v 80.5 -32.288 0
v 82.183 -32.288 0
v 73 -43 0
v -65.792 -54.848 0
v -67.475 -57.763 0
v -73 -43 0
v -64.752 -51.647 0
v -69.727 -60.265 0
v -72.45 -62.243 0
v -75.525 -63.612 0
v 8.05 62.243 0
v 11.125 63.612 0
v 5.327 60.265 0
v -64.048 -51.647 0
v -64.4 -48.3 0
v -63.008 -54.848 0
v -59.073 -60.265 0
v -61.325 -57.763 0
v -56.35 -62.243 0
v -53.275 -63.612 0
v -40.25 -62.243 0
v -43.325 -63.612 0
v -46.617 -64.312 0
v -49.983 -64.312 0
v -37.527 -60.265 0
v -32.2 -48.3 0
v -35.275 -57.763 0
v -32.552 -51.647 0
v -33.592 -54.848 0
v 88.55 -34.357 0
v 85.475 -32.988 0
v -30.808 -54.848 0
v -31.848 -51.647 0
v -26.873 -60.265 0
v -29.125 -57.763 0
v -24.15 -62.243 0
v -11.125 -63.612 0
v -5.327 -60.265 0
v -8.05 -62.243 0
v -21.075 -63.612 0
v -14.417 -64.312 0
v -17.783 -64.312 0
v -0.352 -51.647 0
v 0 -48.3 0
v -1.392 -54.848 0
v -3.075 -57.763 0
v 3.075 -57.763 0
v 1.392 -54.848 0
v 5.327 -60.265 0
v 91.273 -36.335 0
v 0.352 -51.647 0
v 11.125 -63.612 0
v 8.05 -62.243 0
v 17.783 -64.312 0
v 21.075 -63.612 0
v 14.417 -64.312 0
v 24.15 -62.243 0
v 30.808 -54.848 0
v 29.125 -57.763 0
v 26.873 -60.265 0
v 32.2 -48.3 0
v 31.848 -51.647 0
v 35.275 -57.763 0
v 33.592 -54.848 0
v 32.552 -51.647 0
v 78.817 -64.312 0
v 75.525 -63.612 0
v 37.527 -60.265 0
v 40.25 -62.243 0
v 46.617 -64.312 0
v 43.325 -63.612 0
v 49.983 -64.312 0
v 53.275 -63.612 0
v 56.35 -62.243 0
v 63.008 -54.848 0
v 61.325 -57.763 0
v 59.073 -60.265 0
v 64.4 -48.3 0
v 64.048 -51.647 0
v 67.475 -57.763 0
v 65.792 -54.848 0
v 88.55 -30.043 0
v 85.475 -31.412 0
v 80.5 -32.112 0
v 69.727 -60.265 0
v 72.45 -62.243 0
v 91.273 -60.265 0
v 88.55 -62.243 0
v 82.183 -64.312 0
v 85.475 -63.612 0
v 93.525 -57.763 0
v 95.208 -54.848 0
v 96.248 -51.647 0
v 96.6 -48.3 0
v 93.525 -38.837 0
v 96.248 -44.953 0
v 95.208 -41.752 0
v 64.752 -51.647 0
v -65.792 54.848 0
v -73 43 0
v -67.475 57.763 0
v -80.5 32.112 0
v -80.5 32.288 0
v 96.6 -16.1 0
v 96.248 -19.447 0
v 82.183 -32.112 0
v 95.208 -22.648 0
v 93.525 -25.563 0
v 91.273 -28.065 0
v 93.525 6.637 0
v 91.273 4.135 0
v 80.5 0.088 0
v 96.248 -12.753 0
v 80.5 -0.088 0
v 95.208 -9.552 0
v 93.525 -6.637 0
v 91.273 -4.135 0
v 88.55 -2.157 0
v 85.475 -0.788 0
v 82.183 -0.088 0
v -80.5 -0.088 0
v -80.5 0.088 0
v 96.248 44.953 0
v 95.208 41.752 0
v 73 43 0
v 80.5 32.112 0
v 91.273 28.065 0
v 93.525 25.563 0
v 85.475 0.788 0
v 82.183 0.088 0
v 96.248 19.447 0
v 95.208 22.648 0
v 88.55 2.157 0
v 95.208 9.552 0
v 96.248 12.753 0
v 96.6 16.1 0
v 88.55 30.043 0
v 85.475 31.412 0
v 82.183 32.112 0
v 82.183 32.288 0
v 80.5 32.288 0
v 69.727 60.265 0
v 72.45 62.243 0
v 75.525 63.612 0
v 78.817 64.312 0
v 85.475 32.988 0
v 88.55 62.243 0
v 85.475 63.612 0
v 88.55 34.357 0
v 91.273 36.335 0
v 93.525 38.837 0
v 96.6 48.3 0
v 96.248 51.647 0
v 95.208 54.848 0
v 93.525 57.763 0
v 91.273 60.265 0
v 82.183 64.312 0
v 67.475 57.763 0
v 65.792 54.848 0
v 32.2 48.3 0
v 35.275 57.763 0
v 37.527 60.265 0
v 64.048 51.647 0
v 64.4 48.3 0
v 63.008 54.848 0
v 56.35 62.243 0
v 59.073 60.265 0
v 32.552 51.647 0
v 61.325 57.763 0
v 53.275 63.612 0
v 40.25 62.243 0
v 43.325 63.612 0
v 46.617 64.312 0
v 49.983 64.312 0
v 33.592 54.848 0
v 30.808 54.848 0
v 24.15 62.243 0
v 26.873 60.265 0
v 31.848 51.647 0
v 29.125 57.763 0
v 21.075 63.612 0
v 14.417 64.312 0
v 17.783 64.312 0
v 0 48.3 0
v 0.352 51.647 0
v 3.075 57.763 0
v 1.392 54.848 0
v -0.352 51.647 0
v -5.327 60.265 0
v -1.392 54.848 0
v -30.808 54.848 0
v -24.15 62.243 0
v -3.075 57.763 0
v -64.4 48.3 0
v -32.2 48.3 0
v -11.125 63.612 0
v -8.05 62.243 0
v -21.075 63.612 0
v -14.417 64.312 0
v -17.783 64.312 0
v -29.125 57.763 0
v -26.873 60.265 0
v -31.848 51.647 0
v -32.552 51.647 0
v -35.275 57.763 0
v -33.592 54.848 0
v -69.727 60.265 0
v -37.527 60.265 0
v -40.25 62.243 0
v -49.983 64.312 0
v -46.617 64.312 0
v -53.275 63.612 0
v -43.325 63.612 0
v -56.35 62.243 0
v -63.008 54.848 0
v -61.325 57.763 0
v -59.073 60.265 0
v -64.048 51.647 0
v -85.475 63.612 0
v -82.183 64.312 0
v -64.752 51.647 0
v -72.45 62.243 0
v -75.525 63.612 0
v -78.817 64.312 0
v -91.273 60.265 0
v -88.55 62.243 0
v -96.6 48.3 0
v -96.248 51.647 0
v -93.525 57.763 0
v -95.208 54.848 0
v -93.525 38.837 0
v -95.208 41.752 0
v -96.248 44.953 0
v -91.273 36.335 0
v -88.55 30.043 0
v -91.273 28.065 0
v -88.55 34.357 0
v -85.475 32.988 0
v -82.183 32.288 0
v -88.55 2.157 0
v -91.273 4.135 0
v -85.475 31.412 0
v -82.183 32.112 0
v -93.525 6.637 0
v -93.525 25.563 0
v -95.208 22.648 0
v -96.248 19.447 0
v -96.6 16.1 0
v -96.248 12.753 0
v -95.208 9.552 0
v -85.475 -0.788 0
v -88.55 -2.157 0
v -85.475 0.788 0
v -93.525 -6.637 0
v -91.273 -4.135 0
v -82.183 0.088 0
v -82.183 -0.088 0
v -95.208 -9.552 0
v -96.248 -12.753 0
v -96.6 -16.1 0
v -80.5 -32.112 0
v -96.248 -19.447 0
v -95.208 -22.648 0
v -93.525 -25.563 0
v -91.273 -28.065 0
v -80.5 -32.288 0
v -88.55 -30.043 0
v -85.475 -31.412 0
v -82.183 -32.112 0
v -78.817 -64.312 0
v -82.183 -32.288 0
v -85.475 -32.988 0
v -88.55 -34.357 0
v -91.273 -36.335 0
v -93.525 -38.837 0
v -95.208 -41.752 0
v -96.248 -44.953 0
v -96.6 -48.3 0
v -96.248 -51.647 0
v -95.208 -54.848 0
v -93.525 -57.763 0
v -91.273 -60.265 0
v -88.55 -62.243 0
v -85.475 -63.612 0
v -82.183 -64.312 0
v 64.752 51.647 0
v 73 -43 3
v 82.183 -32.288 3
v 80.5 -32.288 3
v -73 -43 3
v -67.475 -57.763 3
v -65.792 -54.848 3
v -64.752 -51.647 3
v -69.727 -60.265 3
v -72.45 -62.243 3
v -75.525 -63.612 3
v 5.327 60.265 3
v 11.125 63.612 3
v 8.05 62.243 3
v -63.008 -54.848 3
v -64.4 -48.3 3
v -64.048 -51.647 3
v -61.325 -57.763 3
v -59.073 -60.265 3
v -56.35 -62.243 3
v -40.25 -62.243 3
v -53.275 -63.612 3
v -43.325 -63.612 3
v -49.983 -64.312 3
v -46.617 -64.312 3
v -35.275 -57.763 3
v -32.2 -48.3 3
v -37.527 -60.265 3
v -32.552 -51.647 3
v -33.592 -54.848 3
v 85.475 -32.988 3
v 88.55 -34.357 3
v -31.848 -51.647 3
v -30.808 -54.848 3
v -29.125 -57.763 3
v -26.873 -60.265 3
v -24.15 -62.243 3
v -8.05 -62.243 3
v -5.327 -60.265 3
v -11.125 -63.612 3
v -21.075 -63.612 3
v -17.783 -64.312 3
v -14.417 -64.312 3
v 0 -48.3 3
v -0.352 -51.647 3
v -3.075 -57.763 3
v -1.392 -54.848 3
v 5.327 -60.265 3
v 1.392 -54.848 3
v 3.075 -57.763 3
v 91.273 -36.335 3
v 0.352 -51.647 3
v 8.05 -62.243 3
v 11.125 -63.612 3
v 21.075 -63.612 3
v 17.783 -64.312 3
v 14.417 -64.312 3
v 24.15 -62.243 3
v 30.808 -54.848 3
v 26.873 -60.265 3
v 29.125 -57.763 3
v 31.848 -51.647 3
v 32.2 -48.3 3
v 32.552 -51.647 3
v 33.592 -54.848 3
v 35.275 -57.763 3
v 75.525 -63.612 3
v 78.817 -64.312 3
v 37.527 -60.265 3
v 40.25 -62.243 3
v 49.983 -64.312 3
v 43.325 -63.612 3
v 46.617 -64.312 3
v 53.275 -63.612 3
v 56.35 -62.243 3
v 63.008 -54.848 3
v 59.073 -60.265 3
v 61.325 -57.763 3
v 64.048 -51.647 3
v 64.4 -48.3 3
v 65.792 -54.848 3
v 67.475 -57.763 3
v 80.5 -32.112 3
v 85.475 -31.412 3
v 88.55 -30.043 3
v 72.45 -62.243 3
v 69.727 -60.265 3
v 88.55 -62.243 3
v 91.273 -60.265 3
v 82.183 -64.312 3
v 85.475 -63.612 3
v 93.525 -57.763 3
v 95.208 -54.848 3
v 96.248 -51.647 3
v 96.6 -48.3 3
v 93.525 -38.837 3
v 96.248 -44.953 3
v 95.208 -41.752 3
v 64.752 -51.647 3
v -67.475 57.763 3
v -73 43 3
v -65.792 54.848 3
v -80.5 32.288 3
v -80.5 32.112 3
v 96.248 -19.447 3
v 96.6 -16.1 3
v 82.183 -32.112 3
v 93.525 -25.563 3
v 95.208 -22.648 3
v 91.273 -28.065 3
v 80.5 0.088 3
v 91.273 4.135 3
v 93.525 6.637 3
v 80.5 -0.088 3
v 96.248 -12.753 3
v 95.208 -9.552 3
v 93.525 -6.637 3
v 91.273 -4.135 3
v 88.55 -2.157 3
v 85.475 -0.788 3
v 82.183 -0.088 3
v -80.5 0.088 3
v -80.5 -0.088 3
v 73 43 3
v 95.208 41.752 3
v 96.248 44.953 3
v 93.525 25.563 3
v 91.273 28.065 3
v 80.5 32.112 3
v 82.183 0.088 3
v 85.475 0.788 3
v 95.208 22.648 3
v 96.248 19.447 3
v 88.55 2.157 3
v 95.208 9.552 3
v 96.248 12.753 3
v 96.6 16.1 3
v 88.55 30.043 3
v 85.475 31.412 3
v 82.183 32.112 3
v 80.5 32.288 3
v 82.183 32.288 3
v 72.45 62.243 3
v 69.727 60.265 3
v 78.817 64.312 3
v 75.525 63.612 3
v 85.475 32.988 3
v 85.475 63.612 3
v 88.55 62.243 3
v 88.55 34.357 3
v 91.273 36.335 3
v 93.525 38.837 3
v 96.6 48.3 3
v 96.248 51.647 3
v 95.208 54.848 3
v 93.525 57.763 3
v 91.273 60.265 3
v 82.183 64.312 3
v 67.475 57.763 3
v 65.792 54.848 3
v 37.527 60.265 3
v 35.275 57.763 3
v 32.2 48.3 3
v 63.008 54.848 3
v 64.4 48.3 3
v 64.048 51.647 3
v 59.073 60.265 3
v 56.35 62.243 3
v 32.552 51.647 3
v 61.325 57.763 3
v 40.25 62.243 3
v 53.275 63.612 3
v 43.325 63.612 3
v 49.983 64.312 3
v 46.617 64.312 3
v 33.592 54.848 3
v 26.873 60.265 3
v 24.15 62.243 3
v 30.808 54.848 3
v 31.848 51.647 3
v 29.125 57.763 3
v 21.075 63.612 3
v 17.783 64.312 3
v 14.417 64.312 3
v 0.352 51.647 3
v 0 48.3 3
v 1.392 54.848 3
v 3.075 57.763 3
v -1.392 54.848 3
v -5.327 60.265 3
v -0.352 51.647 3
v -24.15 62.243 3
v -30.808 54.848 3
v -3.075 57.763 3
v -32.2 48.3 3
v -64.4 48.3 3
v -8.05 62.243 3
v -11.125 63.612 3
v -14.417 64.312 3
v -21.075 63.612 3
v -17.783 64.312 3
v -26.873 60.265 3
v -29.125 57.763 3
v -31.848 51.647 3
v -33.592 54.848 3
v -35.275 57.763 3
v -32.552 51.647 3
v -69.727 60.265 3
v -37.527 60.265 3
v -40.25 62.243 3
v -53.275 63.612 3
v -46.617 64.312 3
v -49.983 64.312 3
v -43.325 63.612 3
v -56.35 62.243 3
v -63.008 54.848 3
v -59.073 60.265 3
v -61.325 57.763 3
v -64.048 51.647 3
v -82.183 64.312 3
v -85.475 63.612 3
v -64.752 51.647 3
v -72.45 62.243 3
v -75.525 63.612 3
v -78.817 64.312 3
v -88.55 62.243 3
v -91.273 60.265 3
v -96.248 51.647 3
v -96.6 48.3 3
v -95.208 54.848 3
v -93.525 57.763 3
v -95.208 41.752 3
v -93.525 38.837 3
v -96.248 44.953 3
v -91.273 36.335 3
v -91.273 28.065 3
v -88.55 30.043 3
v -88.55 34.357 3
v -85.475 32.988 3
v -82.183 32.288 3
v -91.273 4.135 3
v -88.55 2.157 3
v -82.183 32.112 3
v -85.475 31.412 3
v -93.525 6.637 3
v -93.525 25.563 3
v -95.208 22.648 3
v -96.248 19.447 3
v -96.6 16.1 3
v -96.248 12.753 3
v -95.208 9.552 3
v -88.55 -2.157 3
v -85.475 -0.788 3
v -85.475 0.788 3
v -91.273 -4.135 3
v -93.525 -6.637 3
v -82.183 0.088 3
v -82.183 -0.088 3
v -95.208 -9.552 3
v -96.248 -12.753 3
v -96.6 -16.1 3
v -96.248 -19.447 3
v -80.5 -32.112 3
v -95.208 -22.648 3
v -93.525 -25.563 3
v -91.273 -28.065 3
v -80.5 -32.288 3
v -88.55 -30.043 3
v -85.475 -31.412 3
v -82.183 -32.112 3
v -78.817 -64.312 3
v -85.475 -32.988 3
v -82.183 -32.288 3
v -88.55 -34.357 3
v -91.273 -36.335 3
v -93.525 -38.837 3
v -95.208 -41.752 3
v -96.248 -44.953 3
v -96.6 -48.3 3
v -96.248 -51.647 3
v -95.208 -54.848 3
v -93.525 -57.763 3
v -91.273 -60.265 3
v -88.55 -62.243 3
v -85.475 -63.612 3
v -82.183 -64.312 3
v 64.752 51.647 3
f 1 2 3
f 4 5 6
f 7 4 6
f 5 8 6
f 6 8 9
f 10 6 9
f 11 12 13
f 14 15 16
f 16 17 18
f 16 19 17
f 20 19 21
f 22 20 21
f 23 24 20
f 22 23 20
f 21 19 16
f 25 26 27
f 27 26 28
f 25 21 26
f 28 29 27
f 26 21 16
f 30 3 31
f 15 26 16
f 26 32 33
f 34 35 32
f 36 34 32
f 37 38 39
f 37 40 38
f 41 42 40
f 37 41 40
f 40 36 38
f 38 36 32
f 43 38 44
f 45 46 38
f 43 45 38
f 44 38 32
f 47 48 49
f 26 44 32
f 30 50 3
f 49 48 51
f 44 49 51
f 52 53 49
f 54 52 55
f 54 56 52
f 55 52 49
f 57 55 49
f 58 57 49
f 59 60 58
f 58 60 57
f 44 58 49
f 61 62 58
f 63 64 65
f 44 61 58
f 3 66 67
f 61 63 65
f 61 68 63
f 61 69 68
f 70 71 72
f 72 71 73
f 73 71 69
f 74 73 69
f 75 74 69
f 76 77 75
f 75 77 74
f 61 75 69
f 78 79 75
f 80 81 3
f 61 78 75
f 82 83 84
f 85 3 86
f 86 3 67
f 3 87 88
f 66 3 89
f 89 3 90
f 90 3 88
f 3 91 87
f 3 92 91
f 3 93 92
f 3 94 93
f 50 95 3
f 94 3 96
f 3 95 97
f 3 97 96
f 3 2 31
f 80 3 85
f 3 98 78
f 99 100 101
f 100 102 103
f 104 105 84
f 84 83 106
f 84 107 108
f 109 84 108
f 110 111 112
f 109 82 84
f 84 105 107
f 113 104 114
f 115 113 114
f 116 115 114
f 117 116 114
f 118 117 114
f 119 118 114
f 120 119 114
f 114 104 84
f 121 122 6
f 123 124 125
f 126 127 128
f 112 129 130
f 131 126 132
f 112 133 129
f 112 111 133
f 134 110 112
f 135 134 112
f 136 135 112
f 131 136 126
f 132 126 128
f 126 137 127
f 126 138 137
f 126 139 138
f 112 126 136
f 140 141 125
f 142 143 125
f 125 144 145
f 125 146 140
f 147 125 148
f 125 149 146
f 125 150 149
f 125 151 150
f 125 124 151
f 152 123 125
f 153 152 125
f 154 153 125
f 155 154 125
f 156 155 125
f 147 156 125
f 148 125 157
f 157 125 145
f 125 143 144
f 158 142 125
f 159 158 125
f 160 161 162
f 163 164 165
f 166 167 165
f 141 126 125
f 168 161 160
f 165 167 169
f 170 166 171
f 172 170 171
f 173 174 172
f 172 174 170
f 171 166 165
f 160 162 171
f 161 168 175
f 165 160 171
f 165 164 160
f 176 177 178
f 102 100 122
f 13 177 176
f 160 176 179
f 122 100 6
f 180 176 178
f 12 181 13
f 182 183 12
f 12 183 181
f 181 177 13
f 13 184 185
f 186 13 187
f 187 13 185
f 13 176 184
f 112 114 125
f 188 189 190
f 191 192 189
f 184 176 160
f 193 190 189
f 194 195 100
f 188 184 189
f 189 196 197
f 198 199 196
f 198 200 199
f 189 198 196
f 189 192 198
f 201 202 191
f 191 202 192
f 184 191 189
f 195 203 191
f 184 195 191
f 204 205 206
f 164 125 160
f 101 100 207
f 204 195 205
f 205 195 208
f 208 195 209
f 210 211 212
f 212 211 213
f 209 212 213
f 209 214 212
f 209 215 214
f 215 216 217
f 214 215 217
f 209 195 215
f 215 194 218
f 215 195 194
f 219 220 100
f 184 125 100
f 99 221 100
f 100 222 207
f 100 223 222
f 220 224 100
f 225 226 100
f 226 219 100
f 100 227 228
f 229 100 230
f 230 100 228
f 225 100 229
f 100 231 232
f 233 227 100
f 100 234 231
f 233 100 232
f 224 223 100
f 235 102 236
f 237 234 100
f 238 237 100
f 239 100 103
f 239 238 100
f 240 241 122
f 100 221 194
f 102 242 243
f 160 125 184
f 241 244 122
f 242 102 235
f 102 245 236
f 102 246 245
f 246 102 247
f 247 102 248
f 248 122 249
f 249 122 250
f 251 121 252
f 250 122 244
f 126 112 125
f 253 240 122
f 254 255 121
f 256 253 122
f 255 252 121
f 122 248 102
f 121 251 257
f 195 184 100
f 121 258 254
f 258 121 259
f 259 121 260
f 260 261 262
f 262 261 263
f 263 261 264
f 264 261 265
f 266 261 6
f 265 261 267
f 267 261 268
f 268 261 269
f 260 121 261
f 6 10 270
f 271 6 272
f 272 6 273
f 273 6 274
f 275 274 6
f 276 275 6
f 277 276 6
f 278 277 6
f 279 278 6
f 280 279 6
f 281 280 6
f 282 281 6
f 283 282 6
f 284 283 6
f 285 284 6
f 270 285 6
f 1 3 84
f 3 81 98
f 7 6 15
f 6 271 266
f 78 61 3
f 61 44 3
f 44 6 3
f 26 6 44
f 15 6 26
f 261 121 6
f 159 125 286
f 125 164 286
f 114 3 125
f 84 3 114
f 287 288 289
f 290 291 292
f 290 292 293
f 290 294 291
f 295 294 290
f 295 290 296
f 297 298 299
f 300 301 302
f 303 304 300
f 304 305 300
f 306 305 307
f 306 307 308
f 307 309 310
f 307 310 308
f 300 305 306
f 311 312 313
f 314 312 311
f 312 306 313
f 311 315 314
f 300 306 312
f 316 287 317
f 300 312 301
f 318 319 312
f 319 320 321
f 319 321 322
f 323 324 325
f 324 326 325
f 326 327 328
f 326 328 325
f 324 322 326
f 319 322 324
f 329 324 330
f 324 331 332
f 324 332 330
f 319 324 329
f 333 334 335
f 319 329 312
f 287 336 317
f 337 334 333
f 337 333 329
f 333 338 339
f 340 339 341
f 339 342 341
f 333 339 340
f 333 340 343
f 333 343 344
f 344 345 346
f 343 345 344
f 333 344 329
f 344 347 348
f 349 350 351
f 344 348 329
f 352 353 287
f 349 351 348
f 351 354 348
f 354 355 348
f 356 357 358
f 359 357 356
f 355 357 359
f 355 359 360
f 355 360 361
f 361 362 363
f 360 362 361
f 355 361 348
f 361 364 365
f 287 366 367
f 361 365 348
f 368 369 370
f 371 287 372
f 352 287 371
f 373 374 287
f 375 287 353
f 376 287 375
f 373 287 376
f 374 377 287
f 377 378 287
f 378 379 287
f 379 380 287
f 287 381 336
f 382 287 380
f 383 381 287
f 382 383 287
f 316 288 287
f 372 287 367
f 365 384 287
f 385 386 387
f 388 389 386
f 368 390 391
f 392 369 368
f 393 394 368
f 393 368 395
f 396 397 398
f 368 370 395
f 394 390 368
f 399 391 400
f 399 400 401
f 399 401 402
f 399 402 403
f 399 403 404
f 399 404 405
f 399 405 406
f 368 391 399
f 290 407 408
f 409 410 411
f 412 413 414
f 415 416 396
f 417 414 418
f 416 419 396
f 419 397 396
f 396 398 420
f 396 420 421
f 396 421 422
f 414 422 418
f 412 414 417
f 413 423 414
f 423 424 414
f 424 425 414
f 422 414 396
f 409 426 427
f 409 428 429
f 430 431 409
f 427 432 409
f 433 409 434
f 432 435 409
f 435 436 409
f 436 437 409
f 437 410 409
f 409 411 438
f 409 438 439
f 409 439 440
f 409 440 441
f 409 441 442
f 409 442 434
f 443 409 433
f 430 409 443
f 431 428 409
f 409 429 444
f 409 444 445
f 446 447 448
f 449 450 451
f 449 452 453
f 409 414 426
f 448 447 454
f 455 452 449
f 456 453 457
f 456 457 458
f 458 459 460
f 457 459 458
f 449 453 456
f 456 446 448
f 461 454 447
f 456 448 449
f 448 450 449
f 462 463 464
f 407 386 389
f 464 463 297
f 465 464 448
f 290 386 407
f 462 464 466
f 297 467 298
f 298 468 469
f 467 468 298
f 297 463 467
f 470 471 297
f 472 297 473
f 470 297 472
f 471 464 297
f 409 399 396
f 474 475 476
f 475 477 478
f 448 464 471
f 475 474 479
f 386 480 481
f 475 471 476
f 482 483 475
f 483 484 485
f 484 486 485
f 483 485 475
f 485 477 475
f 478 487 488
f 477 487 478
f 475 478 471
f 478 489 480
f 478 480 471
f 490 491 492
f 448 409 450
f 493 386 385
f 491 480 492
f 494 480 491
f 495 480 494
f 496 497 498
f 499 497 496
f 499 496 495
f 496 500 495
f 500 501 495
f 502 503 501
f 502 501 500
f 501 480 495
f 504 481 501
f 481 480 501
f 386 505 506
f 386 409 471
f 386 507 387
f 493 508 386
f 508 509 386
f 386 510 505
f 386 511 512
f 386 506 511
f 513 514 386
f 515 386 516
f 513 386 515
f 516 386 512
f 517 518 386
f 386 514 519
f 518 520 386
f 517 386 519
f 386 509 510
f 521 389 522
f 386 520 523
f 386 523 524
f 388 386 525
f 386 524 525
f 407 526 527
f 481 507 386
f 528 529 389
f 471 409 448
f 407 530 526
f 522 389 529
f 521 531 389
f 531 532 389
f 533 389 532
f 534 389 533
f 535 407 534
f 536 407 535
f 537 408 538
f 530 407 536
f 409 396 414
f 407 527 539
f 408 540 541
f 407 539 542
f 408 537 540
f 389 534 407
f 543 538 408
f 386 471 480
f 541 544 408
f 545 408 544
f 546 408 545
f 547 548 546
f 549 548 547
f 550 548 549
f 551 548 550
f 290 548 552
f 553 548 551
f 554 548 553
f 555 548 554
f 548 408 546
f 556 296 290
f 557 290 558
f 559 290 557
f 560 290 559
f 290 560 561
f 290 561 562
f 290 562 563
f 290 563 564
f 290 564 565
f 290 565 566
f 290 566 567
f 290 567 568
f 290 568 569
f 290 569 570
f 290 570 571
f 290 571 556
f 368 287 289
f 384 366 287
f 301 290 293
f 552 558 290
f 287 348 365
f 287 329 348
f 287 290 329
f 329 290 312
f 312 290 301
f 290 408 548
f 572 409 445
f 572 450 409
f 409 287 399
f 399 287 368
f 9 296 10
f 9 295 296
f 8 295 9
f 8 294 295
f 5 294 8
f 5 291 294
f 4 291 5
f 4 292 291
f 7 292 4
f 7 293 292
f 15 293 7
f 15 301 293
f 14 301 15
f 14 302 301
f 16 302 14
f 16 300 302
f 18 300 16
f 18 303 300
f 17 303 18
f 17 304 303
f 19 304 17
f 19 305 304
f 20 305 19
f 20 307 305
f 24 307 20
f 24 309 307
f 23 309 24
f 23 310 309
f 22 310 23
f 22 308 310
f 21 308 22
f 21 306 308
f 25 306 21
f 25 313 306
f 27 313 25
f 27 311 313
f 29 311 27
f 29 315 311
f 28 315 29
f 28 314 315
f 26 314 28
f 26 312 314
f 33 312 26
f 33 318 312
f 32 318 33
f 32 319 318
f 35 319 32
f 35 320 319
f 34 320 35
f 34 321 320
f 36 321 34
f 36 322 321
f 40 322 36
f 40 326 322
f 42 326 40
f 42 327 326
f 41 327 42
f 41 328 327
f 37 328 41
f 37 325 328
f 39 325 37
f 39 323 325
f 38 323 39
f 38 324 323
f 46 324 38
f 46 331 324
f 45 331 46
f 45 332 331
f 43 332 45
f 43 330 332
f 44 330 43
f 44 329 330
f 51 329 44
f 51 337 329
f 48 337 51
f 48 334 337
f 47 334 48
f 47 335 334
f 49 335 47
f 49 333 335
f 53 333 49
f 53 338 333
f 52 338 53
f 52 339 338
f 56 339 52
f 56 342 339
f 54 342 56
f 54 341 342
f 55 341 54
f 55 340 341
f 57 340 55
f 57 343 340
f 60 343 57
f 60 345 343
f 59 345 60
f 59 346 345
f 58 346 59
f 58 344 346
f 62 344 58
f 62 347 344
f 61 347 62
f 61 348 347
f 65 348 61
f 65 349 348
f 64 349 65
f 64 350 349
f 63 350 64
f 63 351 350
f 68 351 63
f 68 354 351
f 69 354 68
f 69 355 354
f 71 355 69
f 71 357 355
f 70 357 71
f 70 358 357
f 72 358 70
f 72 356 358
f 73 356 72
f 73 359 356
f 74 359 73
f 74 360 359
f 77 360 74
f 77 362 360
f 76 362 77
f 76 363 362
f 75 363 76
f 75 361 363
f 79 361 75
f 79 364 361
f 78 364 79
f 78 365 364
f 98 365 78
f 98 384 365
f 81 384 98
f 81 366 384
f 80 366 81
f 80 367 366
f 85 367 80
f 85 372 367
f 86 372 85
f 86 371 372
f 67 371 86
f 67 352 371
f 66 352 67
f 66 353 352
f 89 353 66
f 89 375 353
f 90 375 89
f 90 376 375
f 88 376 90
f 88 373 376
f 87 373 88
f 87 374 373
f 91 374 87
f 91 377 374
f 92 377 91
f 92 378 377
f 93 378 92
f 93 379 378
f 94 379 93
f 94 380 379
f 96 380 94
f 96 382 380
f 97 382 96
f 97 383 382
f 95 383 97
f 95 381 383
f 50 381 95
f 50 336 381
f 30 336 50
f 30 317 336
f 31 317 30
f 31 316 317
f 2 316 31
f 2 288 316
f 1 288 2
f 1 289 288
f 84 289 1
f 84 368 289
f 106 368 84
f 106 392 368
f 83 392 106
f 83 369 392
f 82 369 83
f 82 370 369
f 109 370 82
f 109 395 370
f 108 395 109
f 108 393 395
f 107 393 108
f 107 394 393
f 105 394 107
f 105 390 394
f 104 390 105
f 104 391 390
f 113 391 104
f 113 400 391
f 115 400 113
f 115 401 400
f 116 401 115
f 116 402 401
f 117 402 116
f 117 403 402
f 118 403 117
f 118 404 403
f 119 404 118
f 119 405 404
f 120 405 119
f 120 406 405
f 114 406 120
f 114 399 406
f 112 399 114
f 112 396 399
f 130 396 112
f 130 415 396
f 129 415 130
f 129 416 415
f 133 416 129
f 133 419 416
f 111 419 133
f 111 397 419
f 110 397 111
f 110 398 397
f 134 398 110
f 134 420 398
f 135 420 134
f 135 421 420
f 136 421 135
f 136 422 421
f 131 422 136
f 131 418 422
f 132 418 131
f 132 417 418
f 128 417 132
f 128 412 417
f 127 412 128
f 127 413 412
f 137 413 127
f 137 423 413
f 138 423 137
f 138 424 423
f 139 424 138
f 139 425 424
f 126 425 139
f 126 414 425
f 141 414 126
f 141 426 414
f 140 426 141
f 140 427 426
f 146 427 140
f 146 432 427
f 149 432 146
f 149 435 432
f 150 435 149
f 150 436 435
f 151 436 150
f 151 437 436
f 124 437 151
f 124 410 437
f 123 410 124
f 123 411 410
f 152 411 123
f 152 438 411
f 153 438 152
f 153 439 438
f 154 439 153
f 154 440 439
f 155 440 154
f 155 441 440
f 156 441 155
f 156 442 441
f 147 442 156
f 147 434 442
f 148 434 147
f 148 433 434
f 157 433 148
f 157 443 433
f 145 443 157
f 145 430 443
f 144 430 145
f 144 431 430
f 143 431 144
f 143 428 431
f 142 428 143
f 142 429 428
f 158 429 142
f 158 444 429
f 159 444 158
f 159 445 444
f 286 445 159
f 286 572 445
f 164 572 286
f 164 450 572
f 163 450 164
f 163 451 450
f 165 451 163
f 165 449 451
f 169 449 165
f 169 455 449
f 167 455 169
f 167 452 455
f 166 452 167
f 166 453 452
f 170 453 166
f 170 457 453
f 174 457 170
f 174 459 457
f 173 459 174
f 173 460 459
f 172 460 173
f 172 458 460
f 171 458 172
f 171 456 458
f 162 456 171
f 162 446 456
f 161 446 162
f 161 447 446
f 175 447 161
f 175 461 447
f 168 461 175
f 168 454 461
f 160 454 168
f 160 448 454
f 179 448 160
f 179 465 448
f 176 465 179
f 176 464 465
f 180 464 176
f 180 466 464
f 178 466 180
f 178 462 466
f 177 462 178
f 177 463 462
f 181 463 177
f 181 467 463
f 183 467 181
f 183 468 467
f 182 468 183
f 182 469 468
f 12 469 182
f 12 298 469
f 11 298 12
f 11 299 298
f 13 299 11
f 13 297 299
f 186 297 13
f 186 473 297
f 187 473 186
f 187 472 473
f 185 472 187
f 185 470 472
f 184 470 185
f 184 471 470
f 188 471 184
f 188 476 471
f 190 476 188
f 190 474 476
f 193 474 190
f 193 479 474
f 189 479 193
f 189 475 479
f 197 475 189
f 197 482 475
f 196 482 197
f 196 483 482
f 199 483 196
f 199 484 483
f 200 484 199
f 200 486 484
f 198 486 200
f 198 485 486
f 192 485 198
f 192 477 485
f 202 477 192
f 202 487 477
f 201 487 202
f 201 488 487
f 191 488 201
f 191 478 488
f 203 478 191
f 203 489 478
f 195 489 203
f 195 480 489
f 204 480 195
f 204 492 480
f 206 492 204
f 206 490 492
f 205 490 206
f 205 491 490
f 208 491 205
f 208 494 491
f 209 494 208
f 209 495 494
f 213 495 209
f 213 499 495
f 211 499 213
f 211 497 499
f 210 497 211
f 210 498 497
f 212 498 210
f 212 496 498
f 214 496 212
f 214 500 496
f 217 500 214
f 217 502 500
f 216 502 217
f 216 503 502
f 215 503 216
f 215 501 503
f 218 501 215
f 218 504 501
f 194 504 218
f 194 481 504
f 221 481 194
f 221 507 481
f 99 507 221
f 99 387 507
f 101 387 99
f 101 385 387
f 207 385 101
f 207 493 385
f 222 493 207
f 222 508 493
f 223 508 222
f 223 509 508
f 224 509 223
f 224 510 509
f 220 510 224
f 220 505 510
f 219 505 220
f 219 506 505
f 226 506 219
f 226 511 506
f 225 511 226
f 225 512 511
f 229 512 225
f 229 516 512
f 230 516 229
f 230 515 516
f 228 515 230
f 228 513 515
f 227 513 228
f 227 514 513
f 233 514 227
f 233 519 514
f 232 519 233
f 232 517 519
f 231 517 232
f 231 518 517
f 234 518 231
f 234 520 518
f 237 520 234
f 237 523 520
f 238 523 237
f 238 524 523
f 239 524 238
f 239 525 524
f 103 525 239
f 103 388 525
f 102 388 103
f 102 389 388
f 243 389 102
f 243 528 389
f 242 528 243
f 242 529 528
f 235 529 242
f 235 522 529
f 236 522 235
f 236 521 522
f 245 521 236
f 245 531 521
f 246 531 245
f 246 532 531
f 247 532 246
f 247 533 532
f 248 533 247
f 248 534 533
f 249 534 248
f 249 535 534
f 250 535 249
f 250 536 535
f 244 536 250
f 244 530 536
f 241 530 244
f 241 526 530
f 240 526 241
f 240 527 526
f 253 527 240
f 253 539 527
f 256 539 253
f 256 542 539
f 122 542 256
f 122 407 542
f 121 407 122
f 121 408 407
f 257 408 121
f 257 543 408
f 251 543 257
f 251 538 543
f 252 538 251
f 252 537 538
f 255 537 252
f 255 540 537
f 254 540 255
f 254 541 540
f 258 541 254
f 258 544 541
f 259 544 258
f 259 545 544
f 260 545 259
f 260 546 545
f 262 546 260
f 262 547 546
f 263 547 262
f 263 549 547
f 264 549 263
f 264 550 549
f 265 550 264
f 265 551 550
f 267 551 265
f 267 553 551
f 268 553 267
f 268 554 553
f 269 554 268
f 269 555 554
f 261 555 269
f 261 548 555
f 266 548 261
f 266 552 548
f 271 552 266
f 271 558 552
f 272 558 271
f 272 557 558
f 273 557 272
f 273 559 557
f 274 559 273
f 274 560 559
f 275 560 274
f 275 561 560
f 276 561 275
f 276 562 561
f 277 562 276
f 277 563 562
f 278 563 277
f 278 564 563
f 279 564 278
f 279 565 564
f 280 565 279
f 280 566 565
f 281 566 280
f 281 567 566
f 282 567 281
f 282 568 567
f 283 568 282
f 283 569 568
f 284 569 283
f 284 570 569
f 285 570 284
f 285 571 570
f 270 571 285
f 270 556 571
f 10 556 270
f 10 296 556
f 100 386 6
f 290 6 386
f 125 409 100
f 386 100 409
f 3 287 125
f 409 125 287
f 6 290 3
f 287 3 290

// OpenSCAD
// Parameters
socket_width = 146;   // UK double gang socket width in mm
socket_height = 86;   // UK double gang socket height in mm
border_width = 10;    // Border width around the socket
num_circles_x = 6;    // Number of circles along width
thickness = 3;

// Derived dimensions
total_width = socket_width + 1.5 * border_width;
min_height = socket_height + 1.5 * border_width;
circle_diameter_x = total_width / (num_circles_x - 1);

num_circles_y = ceil((min_height + (0.7 * circle_diameter_x)) / circle_diameter_x);
total_height = circle_diameter_x * (num_circles_y - 1);
circle_diameter_y = circle_diameter_x;

// Function to place circles along an edge
module place_circles(start, end, count) {
    for (i = [0 : count - 1]) {
        pos = start + (end - start) * i / (count - 1);
        translate([pos.x, pos.y]) circle(d=circle_diameter_x);
    }
}

// Generate filled scalloped rectangle with cutout
linear_extrude(height=thickness) {
difference() {
    union() {
        // Filled rectangle
        square([total_width, total_height], center=true);
        
        // Add external scallops
        scalloped_rectangle();
    }
    
    // Cutout for the socket
    square([socket_width, socket_height], center=true);
}
}
// Generate circles around the rectangle
module scalloped_rectangle() {
    // Top edge
    place_circles([ -total_width / 2, total_height / 2 ], 
                  [ total_width / 2, total_height / 2 ], num_circles_x);
    
    // Bottom edge
    place_circles([ -total_width / 2, -total_height / 2 ], 
                  [ total_width / 2, -total_height / 2 ], num_circles_x);
    
    // Left edge
    place_circles([ -total_width / 2, -total_height / 2 ], 
                  [ -total_width / 2, total_height / 2 ], num_circles_y);
    
    // Right edge
    place_circles([ total_width / 2, -total_height / 2 ], 
                  [ total_width / 2, total_height / 2 ], num_circles_y);
}
